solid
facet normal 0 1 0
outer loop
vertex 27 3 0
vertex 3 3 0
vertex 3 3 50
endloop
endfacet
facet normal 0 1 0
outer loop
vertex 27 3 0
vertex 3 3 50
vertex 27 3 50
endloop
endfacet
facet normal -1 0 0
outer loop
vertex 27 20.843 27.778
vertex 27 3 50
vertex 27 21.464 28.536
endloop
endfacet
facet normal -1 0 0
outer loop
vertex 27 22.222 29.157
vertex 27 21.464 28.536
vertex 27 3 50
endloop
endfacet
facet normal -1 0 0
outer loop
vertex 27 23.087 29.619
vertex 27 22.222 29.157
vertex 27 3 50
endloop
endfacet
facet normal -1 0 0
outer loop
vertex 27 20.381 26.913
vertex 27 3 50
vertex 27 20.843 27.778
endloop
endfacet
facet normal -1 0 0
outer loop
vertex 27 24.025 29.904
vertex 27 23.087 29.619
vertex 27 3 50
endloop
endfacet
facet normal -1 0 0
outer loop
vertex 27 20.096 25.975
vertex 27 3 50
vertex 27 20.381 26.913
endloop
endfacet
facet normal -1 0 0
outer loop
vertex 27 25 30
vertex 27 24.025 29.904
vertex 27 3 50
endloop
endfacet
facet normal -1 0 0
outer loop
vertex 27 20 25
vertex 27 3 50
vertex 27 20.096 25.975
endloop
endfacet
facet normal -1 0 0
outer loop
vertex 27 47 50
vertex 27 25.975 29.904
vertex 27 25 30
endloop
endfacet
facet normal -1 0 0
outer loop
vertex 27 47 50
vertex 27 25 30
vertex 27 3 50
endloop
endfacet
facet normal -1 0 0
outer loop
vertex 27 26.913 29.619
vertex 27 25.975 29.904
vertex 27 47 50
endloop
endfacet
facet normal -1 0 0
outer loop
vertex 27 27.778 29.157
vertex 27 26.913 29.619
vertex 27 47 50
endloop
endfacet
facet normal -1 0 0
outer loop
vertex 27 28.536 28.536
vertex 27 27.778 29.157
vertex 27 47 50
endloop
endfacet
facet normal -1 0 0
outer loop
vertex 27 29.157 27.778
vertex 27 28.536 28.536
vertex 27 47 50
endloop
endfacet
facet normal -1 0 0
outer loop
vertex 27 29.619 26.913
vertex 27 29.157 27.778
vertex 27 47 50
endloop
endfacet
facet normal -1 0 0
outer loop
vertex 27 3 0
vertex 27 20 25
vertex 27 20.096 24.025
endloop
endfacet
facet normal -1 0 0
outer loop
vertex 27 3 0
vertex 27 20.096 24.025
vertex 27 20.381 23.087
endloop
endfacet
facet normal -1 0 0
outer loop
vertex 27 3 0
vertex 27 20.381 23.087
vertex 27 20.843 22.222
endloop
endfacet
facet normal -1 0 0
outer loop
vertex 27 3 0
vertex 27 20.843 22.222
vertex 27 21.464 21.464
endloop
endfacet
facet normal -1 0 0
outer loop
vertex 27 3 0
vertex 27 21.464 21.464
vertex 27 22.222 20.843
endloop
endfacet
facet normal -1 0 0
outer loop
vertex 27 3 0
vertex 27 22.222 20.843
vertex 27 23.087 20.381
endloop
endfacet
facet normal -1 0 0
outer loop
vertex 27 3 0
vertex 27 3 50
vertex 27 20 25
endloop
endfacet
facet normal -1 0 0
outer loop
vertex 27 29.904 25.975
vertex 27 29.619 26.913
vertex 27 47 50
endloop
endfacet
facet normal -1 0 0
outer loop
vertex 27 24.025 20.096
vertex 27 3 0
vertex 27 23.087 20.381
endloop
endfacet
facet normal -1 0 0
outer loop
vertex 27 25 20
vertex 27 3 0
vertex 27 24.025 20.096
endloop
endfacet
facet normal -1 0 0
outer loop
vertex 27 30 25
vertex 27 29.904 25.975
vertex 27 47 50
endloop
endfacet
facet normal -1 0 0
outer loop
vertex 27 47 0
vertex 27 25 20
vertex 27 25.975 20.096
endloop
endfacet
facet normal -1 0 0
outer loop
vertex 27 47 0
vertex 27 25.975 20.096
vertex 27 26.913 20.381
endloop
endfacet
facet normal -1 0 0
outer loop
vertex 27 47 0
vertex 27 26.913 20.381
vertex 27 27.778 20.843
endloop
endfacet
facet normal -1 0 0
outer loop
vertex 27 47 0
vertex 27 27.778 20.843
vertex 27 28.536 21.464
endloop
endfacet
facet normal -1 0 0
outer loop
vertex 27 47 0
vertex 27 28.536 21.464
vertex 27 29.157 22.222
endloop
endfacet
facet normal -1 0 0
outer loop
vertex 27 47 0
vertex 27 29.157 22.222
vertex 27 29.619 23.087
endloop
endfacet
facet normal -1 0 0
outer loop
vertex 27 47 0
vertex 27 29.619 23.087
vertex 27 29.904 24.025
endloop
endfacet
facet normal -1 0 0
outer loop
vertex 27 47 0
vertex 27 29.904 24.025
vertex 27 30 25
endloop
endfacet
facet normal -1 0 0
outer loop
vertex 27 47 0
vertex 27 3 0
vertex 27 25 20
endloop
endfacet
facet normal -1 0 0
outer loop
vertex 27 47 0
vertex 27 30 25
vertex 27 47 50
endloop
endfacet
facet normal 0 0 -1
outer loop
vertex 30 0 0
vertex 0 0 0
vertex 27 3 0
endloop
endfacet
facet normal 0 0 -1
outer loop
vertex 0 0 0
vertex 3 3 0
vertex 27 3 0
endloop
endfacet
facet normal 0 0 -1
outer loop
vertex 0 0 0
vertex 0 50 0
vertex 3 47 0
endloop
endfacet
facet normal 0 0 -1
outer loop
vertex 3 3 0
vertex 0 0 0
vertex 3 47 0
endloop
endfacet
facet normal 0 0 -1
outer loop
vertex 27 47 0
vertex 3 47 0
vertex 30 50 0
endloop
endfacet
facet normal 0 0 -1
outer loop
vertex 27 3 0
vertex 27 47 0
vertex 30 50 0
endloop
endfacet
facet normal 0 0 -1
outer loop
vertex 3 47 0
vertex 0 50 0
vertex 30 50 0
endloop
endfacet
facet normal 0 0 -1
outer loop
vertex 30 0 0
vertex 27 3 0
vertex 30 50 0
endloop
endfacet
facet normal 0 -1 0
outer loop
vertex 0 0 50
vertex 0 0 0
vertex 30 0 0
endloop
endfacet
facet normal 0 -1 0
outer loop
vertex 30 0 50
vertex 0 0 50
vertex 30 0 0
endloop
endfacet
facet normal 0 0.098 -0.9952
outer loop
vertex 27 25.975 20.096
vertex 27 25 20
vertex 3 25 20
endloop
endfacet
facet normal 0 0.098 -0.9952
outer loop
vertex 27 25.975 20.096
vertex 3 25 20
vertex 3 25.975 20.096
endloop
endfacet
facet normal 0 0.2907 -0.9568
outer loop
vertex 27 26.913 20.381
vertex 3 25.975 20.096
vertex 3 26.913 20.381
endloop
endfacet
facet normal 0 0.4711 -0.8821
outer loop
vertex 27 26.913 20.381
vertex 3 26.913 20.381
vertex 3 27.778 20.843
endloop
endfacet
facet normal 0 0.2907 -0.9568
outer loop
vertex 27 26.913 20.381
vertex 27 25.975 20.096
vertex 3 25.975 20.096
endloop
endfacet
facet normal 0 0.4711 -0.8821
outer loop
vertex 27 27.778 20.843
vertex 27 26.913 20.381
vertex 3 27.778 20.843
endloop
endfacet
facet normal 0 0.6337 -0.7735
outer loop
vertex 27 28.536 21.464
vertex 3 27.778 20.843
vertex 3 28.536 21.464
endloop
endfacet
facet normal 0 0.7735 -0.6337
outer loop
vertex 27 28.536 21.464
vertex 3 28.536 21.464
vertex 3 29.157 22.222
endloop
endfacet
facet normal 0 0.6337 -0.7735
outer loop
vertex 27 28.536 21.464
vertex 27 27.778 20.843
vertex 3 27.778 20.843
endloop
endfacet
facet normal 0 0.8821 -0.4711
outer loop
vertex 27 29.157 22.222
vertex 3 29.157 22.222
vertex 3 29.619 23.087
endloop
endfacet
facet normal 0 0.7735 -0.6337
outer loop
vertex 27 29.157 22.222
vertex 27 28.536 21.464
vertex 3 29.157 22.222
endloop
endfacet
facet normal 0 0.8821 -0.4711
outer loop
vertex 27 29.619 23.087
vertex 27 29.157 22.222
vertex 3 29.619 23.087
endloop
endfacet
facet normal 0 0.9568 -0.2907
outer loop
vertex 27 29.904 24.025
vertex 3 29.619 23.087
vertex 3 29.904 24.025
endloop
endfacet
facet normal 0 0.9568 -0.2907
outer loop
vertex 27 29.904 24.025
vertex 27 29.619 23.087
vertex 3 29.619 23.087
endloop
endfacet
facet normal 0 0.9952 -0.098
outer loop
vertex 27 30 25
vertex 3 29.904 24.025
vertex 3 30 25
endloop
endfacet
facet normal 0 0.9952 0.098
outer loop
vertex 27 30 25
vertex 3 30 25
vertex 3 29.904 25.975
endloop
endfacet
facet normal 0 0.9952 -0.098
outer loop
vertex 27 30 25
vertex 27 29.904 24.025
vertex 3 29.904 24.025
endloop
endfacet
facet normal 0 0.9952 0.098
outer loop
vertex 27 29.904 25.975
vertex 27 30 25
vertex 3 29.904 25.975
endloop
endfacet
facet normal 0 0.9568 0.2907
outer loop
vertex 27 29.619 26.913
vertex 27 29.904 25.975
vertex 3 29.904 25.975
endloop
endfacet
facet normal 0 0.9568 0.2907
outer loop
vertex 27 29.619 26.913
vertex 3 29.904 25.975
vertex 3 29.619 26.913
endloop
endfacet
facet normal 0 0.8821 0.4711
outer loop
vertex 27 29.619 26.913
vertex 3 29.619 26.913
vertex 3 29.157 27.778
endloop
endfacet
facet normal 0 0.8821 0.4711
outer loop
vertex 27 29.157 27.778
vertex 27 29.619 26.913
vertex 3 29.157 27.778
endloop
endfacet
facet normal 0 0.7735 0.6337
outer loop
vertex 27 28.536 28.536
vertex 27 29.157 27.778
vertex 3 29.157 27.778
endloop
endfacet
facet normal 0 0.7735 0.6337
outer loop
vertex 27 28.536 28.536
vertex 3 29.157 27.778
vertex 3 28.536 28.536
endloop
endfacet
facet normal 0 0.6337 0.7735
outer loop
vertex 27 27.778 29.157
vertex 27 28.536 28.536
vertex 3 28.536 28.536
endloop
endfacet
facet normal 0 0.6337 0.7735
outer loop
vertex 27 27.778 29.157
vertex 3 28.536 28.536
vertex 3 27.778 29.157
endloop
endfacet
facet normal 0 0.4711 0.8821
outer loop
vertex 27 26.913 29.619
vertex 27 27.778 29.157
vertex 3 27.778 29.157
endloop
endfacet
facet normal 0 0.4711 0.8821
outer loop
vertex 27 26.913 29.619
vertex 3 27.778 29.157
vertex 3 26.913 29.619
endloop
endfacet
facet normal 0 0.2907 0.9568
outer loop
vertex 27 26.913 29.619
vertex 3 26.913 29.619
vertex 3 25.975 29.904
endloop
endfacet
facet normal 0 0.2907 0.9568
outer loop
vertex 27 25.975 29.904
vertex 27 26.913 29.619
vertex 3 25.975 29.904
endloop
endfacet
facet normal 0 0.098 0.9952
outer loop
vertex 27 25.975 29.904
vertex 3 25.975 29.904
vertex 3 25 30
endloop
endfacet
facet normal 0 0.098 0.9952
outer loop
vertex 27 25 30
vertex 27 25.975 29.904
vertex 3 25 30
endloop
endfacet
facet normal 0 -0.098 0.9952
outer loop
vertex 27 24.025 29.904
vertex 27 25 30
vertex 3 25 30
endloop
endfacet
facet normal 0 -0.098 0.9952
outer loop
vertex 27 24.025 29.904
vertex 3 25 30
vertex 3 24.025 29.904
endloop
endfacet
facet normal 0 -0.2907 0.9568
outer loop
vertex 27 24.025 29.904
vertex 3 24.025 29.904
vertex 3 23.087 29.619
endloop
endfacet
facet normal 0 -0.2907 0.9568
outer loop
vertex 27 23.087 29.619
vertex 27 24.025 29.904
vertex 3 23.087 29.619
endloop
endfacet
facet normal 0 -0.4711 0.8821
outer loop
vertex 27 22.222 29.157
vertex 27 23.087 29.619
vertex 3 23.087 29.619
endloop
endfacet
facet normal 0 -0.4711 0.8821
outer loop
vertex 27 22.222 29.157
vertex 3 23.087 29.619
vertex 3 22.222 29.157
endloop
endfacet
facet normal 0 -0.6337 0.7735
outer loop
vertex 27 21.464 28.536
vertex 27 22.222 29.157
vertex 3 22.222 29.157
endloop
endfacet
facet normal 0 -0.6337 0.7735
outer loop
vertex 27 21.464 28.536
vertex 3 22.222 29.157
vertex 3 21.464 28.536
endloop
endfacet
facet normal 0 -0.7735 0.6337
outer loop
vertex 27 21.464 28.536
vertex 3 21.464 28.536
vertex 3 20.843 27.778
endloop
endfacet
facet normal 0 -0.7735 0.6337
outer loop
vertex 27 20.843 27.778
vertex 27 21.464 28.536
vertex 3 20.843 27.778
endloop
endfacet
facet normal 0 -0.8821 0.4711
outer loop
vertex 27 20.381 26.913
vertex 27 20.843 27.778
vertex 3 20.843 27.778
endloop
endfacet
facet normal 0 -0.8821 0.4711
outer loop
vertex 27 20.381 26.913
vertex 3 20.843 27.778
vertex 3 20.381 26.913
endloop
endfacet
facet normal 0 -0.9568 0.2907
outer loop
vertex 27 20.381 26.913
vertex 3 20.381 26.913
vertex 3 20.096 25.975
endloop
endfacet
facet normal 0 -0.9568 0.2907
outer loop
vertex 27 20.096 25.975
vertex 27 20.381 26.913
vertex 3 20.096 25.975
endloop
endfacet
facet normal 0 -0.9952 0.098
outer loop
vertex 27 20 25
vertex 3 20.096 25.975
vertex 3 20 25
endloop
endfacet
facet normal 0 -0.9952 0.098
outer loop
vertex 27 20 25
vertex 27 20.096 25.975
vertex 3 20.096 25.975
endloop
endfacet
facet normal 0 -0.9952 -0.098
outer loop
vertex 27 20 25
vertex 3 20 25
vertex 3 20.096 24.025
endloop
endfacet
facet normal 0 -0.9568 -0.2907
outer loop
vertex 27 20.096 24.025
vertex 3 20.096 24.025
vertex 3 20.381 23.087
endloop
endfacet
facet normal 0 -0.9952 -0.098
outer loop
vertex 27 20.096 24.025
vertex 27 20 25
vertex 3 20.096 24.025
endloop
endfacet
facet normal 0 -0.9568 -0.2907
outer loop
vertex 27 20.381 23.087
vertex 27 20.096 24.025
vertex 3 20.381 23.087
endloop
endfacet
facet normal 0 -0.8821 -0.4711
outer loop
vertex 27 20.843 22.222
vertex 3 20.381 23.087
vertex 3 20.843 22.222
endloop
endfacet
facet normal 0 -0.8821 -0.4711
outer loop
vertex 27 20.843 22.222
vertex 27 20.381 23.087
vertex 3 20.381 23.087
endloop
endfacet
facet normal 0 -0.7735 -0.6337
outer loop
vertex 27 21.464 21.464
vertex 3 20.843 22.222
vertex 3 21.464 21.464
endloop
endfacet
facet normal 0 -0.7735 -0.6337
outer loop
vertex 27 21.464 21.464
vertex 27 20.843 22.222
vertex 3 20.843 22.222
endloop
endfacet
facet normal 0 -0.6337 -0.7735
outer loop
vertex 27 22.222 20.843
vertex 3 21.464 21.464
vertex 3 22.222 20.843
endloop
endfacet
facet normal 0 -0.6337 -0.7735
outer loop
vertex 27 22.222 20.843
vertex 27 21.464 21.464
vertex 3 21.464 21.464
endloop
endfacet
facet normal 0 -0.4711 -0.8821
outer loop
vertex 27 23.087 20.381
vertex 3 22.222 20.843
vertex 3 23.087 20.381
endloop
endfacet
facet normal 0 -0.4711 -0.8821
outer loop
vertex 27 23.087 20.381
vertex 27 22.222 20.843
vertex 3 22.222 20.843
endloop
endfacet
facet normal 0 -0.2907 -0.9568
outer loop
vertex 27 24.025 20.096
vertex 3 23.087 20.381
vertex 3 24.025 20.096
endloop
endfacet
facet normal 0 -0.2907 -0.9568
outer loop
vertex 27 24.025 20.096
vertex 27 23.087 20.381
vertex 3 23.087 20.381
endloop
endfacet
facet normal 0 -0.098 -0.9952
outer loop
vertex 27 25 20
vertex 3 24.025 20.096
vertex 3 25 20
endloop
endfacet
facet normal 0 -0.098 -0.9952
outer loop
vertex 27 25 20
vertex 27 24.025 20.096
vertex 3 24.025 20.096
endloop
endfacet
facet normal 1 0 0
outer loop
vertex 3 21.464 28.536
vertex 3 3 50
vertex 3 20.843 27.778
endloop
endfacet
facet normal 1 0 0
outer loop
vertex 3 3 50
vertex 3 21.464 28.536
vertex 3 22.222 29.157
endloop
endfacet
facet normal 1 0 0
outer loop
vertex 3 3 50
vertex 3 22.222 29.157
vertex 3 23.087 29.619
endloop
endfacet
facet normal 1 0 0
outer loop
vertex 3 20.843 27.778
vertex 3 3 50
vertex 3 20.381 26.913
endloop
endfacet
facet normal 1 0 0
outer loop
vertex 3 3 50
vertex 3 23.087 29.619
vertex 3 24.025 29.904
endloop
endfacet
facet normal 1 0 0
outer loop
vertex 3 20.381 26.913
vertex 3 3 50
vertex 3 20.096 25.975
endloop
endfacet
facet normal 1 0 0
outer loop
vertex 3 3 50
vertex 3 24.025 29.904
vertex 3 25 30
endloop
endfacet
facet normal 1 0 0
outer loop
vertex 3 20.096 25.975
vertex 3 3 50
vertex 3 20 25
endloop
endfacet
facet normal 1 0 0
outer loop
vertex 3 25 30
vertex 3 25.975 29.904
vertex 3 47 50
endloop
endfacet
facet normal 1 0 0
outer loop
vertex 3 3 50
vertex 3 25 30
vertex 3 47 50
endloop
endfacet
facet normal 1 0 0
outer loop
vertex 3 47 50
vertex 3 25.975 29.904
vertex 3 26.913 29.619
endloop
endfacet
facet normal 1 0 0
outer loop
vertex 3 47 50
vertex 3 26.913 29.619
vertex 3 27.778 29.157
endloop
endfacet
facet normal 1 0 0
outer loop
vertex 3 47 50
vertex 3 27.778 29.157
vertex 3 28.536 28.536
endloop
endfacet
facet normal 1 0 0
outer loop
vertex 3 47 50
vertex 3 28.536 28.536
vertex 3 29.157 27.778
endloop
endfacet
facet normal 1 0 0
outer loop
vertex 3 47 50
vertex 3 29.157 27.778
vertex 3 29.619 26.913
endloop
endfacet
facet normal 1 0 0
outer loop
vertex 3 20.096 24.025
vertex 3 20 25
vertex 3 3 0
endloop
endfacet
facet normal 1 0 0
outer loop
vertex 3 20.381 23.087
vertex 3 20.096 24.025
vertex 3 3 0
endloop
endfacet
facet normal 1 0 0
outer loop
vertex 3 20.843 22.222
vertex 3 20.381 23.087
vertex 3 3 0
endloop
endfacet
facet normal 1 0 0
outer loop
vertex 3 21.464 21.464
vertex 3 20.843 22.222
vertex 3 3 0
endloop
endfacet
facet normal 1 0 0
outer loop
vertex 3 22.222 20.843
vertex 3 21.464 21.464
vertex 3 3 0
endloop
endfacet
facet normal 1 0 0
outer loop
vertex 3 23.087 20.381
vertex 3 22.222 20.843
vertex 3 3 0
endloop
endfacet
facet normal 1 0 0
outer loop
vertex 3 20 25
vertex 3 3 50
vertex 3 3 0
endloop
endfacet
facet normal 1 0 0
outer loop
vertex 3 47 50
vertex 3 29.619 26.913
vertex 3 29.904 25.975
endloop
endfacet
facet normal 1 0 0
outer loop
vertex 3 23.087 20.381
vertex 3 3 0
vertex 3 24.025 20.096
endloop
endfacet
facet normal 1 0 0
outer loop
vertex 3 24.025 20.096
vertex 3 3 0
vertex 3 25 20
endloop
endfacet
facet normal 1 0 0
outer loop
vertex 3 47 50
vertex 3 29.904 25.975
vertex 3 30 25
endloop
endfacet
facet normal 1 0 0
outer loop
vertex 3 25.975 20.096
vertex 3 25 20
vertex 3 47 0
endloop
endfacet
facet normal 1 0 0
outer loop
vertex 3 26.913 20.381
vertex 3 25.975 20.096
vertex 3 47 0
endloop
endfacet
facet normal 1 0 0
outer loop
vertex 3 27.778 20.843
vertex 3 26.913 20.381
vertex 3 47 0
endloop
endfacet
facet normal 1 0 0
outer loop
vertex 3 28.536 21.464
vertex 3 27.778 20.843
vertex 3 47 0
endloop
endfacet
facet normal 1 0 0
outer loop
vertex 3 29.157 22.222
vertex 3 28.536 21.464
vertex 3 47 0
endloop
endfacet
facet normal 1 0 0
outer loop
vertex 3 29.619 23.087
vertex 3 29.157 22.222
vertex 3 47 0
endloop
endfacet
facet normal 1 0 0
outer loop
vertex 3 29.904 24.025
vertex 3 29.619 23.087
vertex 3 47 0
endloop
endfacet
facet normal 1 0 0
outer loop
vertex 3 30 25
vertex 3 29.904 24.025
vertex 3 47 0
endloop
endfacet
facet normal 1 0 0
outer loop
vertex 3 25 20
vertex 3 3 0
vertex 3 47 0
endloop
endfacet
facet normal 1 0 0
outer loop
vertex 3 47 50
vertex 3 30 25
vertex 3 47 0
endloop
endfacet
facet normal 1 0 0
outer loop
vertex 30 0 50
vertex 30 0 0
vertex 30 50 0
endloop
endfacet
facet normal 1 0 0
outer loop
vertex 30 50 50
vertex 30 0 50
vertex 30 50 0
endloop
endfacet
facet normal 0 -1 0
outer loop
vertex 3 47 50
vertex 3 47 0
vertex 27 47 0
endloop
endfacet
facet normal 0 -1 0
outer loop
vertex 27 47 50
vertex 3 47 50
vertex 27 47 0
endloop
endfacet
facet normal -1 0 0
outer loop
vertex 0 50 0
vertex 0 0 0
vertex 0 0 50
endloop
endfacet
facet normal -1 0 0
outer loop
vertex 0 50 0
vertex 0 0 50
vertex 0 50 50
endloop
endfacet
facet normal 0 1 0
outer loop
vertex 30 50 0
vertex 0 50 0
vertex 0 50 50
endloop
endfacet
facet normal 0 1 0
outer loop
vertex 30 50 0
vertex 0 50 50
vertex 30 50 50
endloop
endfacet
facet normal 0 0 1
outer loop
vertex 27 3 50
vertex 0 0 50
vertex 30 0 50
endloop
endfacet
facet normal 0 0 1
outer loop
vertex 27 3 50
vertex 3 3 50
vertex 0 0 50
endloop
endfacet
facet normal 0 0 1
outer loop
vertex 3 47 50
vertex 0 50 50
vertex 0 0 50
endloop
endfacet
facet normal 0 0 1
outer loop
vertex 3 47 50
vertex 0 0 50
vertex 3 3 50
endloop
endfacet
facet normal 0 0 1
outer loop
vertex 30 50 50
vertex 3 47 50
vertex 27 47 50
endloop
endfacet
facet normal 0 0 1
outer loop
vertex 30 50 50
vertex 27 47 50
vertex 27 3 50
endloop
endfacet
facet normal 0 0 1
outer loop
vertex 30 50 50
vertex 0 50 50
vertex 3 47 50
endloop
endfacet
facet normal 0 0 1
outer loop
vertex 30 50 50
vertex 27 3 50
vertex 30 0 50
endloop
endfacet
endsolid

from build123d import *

# Parameters (mm, degrees)
SKETCH1_W           = 30
SKETCH1_H           = 50
SKETCH1_W_2         = 24
SKETCH1_H_2         = 44
EXTRUDE_THIN1_DEPTH = 50
BOSS_EXTRUDE1_REACH = 78.811
SKETCH2_R           = 5


with BuildPart() as part:
    # Sketch1 → Extrude-Thin1 (new body)
    with BuildSketch(Plane.XY):
        with Locations((15, 25)):
            Rectangle(SKETCH1_W, SKETCH1_H)
        with Locations((15, 25)):
            Rectangle(SKETCH1_W_2, SKETCH1_H_2, mode=Mode.SUBTRACT)
    extrude(amount=EXTRUDE_THIN1_DEPTH)

    # Sketch2 → Boss-Extrude1 (add, up to next)
    with BuildSketch(Plane(origin=(30, 0, 0), x_dir=(0, 0, -1), z_dir=(1, 0, 0)), mode=Mode.PRIVATE) as boss_extrude1_sk1:
        with Locations((-25, 25)):
            Circle(SKETCH2_R)
    boss_extrude1_tool1 = extrude(boss_extrude1_sk1.sketch, amount=-BOSS_EXTRUDE1_REACH, mode=Mode.PRIVATE) - part.part
    add(boss_extrude1_tool1.solids().sort_by_distance((30, 25, 25))[0])


solid = part.part
